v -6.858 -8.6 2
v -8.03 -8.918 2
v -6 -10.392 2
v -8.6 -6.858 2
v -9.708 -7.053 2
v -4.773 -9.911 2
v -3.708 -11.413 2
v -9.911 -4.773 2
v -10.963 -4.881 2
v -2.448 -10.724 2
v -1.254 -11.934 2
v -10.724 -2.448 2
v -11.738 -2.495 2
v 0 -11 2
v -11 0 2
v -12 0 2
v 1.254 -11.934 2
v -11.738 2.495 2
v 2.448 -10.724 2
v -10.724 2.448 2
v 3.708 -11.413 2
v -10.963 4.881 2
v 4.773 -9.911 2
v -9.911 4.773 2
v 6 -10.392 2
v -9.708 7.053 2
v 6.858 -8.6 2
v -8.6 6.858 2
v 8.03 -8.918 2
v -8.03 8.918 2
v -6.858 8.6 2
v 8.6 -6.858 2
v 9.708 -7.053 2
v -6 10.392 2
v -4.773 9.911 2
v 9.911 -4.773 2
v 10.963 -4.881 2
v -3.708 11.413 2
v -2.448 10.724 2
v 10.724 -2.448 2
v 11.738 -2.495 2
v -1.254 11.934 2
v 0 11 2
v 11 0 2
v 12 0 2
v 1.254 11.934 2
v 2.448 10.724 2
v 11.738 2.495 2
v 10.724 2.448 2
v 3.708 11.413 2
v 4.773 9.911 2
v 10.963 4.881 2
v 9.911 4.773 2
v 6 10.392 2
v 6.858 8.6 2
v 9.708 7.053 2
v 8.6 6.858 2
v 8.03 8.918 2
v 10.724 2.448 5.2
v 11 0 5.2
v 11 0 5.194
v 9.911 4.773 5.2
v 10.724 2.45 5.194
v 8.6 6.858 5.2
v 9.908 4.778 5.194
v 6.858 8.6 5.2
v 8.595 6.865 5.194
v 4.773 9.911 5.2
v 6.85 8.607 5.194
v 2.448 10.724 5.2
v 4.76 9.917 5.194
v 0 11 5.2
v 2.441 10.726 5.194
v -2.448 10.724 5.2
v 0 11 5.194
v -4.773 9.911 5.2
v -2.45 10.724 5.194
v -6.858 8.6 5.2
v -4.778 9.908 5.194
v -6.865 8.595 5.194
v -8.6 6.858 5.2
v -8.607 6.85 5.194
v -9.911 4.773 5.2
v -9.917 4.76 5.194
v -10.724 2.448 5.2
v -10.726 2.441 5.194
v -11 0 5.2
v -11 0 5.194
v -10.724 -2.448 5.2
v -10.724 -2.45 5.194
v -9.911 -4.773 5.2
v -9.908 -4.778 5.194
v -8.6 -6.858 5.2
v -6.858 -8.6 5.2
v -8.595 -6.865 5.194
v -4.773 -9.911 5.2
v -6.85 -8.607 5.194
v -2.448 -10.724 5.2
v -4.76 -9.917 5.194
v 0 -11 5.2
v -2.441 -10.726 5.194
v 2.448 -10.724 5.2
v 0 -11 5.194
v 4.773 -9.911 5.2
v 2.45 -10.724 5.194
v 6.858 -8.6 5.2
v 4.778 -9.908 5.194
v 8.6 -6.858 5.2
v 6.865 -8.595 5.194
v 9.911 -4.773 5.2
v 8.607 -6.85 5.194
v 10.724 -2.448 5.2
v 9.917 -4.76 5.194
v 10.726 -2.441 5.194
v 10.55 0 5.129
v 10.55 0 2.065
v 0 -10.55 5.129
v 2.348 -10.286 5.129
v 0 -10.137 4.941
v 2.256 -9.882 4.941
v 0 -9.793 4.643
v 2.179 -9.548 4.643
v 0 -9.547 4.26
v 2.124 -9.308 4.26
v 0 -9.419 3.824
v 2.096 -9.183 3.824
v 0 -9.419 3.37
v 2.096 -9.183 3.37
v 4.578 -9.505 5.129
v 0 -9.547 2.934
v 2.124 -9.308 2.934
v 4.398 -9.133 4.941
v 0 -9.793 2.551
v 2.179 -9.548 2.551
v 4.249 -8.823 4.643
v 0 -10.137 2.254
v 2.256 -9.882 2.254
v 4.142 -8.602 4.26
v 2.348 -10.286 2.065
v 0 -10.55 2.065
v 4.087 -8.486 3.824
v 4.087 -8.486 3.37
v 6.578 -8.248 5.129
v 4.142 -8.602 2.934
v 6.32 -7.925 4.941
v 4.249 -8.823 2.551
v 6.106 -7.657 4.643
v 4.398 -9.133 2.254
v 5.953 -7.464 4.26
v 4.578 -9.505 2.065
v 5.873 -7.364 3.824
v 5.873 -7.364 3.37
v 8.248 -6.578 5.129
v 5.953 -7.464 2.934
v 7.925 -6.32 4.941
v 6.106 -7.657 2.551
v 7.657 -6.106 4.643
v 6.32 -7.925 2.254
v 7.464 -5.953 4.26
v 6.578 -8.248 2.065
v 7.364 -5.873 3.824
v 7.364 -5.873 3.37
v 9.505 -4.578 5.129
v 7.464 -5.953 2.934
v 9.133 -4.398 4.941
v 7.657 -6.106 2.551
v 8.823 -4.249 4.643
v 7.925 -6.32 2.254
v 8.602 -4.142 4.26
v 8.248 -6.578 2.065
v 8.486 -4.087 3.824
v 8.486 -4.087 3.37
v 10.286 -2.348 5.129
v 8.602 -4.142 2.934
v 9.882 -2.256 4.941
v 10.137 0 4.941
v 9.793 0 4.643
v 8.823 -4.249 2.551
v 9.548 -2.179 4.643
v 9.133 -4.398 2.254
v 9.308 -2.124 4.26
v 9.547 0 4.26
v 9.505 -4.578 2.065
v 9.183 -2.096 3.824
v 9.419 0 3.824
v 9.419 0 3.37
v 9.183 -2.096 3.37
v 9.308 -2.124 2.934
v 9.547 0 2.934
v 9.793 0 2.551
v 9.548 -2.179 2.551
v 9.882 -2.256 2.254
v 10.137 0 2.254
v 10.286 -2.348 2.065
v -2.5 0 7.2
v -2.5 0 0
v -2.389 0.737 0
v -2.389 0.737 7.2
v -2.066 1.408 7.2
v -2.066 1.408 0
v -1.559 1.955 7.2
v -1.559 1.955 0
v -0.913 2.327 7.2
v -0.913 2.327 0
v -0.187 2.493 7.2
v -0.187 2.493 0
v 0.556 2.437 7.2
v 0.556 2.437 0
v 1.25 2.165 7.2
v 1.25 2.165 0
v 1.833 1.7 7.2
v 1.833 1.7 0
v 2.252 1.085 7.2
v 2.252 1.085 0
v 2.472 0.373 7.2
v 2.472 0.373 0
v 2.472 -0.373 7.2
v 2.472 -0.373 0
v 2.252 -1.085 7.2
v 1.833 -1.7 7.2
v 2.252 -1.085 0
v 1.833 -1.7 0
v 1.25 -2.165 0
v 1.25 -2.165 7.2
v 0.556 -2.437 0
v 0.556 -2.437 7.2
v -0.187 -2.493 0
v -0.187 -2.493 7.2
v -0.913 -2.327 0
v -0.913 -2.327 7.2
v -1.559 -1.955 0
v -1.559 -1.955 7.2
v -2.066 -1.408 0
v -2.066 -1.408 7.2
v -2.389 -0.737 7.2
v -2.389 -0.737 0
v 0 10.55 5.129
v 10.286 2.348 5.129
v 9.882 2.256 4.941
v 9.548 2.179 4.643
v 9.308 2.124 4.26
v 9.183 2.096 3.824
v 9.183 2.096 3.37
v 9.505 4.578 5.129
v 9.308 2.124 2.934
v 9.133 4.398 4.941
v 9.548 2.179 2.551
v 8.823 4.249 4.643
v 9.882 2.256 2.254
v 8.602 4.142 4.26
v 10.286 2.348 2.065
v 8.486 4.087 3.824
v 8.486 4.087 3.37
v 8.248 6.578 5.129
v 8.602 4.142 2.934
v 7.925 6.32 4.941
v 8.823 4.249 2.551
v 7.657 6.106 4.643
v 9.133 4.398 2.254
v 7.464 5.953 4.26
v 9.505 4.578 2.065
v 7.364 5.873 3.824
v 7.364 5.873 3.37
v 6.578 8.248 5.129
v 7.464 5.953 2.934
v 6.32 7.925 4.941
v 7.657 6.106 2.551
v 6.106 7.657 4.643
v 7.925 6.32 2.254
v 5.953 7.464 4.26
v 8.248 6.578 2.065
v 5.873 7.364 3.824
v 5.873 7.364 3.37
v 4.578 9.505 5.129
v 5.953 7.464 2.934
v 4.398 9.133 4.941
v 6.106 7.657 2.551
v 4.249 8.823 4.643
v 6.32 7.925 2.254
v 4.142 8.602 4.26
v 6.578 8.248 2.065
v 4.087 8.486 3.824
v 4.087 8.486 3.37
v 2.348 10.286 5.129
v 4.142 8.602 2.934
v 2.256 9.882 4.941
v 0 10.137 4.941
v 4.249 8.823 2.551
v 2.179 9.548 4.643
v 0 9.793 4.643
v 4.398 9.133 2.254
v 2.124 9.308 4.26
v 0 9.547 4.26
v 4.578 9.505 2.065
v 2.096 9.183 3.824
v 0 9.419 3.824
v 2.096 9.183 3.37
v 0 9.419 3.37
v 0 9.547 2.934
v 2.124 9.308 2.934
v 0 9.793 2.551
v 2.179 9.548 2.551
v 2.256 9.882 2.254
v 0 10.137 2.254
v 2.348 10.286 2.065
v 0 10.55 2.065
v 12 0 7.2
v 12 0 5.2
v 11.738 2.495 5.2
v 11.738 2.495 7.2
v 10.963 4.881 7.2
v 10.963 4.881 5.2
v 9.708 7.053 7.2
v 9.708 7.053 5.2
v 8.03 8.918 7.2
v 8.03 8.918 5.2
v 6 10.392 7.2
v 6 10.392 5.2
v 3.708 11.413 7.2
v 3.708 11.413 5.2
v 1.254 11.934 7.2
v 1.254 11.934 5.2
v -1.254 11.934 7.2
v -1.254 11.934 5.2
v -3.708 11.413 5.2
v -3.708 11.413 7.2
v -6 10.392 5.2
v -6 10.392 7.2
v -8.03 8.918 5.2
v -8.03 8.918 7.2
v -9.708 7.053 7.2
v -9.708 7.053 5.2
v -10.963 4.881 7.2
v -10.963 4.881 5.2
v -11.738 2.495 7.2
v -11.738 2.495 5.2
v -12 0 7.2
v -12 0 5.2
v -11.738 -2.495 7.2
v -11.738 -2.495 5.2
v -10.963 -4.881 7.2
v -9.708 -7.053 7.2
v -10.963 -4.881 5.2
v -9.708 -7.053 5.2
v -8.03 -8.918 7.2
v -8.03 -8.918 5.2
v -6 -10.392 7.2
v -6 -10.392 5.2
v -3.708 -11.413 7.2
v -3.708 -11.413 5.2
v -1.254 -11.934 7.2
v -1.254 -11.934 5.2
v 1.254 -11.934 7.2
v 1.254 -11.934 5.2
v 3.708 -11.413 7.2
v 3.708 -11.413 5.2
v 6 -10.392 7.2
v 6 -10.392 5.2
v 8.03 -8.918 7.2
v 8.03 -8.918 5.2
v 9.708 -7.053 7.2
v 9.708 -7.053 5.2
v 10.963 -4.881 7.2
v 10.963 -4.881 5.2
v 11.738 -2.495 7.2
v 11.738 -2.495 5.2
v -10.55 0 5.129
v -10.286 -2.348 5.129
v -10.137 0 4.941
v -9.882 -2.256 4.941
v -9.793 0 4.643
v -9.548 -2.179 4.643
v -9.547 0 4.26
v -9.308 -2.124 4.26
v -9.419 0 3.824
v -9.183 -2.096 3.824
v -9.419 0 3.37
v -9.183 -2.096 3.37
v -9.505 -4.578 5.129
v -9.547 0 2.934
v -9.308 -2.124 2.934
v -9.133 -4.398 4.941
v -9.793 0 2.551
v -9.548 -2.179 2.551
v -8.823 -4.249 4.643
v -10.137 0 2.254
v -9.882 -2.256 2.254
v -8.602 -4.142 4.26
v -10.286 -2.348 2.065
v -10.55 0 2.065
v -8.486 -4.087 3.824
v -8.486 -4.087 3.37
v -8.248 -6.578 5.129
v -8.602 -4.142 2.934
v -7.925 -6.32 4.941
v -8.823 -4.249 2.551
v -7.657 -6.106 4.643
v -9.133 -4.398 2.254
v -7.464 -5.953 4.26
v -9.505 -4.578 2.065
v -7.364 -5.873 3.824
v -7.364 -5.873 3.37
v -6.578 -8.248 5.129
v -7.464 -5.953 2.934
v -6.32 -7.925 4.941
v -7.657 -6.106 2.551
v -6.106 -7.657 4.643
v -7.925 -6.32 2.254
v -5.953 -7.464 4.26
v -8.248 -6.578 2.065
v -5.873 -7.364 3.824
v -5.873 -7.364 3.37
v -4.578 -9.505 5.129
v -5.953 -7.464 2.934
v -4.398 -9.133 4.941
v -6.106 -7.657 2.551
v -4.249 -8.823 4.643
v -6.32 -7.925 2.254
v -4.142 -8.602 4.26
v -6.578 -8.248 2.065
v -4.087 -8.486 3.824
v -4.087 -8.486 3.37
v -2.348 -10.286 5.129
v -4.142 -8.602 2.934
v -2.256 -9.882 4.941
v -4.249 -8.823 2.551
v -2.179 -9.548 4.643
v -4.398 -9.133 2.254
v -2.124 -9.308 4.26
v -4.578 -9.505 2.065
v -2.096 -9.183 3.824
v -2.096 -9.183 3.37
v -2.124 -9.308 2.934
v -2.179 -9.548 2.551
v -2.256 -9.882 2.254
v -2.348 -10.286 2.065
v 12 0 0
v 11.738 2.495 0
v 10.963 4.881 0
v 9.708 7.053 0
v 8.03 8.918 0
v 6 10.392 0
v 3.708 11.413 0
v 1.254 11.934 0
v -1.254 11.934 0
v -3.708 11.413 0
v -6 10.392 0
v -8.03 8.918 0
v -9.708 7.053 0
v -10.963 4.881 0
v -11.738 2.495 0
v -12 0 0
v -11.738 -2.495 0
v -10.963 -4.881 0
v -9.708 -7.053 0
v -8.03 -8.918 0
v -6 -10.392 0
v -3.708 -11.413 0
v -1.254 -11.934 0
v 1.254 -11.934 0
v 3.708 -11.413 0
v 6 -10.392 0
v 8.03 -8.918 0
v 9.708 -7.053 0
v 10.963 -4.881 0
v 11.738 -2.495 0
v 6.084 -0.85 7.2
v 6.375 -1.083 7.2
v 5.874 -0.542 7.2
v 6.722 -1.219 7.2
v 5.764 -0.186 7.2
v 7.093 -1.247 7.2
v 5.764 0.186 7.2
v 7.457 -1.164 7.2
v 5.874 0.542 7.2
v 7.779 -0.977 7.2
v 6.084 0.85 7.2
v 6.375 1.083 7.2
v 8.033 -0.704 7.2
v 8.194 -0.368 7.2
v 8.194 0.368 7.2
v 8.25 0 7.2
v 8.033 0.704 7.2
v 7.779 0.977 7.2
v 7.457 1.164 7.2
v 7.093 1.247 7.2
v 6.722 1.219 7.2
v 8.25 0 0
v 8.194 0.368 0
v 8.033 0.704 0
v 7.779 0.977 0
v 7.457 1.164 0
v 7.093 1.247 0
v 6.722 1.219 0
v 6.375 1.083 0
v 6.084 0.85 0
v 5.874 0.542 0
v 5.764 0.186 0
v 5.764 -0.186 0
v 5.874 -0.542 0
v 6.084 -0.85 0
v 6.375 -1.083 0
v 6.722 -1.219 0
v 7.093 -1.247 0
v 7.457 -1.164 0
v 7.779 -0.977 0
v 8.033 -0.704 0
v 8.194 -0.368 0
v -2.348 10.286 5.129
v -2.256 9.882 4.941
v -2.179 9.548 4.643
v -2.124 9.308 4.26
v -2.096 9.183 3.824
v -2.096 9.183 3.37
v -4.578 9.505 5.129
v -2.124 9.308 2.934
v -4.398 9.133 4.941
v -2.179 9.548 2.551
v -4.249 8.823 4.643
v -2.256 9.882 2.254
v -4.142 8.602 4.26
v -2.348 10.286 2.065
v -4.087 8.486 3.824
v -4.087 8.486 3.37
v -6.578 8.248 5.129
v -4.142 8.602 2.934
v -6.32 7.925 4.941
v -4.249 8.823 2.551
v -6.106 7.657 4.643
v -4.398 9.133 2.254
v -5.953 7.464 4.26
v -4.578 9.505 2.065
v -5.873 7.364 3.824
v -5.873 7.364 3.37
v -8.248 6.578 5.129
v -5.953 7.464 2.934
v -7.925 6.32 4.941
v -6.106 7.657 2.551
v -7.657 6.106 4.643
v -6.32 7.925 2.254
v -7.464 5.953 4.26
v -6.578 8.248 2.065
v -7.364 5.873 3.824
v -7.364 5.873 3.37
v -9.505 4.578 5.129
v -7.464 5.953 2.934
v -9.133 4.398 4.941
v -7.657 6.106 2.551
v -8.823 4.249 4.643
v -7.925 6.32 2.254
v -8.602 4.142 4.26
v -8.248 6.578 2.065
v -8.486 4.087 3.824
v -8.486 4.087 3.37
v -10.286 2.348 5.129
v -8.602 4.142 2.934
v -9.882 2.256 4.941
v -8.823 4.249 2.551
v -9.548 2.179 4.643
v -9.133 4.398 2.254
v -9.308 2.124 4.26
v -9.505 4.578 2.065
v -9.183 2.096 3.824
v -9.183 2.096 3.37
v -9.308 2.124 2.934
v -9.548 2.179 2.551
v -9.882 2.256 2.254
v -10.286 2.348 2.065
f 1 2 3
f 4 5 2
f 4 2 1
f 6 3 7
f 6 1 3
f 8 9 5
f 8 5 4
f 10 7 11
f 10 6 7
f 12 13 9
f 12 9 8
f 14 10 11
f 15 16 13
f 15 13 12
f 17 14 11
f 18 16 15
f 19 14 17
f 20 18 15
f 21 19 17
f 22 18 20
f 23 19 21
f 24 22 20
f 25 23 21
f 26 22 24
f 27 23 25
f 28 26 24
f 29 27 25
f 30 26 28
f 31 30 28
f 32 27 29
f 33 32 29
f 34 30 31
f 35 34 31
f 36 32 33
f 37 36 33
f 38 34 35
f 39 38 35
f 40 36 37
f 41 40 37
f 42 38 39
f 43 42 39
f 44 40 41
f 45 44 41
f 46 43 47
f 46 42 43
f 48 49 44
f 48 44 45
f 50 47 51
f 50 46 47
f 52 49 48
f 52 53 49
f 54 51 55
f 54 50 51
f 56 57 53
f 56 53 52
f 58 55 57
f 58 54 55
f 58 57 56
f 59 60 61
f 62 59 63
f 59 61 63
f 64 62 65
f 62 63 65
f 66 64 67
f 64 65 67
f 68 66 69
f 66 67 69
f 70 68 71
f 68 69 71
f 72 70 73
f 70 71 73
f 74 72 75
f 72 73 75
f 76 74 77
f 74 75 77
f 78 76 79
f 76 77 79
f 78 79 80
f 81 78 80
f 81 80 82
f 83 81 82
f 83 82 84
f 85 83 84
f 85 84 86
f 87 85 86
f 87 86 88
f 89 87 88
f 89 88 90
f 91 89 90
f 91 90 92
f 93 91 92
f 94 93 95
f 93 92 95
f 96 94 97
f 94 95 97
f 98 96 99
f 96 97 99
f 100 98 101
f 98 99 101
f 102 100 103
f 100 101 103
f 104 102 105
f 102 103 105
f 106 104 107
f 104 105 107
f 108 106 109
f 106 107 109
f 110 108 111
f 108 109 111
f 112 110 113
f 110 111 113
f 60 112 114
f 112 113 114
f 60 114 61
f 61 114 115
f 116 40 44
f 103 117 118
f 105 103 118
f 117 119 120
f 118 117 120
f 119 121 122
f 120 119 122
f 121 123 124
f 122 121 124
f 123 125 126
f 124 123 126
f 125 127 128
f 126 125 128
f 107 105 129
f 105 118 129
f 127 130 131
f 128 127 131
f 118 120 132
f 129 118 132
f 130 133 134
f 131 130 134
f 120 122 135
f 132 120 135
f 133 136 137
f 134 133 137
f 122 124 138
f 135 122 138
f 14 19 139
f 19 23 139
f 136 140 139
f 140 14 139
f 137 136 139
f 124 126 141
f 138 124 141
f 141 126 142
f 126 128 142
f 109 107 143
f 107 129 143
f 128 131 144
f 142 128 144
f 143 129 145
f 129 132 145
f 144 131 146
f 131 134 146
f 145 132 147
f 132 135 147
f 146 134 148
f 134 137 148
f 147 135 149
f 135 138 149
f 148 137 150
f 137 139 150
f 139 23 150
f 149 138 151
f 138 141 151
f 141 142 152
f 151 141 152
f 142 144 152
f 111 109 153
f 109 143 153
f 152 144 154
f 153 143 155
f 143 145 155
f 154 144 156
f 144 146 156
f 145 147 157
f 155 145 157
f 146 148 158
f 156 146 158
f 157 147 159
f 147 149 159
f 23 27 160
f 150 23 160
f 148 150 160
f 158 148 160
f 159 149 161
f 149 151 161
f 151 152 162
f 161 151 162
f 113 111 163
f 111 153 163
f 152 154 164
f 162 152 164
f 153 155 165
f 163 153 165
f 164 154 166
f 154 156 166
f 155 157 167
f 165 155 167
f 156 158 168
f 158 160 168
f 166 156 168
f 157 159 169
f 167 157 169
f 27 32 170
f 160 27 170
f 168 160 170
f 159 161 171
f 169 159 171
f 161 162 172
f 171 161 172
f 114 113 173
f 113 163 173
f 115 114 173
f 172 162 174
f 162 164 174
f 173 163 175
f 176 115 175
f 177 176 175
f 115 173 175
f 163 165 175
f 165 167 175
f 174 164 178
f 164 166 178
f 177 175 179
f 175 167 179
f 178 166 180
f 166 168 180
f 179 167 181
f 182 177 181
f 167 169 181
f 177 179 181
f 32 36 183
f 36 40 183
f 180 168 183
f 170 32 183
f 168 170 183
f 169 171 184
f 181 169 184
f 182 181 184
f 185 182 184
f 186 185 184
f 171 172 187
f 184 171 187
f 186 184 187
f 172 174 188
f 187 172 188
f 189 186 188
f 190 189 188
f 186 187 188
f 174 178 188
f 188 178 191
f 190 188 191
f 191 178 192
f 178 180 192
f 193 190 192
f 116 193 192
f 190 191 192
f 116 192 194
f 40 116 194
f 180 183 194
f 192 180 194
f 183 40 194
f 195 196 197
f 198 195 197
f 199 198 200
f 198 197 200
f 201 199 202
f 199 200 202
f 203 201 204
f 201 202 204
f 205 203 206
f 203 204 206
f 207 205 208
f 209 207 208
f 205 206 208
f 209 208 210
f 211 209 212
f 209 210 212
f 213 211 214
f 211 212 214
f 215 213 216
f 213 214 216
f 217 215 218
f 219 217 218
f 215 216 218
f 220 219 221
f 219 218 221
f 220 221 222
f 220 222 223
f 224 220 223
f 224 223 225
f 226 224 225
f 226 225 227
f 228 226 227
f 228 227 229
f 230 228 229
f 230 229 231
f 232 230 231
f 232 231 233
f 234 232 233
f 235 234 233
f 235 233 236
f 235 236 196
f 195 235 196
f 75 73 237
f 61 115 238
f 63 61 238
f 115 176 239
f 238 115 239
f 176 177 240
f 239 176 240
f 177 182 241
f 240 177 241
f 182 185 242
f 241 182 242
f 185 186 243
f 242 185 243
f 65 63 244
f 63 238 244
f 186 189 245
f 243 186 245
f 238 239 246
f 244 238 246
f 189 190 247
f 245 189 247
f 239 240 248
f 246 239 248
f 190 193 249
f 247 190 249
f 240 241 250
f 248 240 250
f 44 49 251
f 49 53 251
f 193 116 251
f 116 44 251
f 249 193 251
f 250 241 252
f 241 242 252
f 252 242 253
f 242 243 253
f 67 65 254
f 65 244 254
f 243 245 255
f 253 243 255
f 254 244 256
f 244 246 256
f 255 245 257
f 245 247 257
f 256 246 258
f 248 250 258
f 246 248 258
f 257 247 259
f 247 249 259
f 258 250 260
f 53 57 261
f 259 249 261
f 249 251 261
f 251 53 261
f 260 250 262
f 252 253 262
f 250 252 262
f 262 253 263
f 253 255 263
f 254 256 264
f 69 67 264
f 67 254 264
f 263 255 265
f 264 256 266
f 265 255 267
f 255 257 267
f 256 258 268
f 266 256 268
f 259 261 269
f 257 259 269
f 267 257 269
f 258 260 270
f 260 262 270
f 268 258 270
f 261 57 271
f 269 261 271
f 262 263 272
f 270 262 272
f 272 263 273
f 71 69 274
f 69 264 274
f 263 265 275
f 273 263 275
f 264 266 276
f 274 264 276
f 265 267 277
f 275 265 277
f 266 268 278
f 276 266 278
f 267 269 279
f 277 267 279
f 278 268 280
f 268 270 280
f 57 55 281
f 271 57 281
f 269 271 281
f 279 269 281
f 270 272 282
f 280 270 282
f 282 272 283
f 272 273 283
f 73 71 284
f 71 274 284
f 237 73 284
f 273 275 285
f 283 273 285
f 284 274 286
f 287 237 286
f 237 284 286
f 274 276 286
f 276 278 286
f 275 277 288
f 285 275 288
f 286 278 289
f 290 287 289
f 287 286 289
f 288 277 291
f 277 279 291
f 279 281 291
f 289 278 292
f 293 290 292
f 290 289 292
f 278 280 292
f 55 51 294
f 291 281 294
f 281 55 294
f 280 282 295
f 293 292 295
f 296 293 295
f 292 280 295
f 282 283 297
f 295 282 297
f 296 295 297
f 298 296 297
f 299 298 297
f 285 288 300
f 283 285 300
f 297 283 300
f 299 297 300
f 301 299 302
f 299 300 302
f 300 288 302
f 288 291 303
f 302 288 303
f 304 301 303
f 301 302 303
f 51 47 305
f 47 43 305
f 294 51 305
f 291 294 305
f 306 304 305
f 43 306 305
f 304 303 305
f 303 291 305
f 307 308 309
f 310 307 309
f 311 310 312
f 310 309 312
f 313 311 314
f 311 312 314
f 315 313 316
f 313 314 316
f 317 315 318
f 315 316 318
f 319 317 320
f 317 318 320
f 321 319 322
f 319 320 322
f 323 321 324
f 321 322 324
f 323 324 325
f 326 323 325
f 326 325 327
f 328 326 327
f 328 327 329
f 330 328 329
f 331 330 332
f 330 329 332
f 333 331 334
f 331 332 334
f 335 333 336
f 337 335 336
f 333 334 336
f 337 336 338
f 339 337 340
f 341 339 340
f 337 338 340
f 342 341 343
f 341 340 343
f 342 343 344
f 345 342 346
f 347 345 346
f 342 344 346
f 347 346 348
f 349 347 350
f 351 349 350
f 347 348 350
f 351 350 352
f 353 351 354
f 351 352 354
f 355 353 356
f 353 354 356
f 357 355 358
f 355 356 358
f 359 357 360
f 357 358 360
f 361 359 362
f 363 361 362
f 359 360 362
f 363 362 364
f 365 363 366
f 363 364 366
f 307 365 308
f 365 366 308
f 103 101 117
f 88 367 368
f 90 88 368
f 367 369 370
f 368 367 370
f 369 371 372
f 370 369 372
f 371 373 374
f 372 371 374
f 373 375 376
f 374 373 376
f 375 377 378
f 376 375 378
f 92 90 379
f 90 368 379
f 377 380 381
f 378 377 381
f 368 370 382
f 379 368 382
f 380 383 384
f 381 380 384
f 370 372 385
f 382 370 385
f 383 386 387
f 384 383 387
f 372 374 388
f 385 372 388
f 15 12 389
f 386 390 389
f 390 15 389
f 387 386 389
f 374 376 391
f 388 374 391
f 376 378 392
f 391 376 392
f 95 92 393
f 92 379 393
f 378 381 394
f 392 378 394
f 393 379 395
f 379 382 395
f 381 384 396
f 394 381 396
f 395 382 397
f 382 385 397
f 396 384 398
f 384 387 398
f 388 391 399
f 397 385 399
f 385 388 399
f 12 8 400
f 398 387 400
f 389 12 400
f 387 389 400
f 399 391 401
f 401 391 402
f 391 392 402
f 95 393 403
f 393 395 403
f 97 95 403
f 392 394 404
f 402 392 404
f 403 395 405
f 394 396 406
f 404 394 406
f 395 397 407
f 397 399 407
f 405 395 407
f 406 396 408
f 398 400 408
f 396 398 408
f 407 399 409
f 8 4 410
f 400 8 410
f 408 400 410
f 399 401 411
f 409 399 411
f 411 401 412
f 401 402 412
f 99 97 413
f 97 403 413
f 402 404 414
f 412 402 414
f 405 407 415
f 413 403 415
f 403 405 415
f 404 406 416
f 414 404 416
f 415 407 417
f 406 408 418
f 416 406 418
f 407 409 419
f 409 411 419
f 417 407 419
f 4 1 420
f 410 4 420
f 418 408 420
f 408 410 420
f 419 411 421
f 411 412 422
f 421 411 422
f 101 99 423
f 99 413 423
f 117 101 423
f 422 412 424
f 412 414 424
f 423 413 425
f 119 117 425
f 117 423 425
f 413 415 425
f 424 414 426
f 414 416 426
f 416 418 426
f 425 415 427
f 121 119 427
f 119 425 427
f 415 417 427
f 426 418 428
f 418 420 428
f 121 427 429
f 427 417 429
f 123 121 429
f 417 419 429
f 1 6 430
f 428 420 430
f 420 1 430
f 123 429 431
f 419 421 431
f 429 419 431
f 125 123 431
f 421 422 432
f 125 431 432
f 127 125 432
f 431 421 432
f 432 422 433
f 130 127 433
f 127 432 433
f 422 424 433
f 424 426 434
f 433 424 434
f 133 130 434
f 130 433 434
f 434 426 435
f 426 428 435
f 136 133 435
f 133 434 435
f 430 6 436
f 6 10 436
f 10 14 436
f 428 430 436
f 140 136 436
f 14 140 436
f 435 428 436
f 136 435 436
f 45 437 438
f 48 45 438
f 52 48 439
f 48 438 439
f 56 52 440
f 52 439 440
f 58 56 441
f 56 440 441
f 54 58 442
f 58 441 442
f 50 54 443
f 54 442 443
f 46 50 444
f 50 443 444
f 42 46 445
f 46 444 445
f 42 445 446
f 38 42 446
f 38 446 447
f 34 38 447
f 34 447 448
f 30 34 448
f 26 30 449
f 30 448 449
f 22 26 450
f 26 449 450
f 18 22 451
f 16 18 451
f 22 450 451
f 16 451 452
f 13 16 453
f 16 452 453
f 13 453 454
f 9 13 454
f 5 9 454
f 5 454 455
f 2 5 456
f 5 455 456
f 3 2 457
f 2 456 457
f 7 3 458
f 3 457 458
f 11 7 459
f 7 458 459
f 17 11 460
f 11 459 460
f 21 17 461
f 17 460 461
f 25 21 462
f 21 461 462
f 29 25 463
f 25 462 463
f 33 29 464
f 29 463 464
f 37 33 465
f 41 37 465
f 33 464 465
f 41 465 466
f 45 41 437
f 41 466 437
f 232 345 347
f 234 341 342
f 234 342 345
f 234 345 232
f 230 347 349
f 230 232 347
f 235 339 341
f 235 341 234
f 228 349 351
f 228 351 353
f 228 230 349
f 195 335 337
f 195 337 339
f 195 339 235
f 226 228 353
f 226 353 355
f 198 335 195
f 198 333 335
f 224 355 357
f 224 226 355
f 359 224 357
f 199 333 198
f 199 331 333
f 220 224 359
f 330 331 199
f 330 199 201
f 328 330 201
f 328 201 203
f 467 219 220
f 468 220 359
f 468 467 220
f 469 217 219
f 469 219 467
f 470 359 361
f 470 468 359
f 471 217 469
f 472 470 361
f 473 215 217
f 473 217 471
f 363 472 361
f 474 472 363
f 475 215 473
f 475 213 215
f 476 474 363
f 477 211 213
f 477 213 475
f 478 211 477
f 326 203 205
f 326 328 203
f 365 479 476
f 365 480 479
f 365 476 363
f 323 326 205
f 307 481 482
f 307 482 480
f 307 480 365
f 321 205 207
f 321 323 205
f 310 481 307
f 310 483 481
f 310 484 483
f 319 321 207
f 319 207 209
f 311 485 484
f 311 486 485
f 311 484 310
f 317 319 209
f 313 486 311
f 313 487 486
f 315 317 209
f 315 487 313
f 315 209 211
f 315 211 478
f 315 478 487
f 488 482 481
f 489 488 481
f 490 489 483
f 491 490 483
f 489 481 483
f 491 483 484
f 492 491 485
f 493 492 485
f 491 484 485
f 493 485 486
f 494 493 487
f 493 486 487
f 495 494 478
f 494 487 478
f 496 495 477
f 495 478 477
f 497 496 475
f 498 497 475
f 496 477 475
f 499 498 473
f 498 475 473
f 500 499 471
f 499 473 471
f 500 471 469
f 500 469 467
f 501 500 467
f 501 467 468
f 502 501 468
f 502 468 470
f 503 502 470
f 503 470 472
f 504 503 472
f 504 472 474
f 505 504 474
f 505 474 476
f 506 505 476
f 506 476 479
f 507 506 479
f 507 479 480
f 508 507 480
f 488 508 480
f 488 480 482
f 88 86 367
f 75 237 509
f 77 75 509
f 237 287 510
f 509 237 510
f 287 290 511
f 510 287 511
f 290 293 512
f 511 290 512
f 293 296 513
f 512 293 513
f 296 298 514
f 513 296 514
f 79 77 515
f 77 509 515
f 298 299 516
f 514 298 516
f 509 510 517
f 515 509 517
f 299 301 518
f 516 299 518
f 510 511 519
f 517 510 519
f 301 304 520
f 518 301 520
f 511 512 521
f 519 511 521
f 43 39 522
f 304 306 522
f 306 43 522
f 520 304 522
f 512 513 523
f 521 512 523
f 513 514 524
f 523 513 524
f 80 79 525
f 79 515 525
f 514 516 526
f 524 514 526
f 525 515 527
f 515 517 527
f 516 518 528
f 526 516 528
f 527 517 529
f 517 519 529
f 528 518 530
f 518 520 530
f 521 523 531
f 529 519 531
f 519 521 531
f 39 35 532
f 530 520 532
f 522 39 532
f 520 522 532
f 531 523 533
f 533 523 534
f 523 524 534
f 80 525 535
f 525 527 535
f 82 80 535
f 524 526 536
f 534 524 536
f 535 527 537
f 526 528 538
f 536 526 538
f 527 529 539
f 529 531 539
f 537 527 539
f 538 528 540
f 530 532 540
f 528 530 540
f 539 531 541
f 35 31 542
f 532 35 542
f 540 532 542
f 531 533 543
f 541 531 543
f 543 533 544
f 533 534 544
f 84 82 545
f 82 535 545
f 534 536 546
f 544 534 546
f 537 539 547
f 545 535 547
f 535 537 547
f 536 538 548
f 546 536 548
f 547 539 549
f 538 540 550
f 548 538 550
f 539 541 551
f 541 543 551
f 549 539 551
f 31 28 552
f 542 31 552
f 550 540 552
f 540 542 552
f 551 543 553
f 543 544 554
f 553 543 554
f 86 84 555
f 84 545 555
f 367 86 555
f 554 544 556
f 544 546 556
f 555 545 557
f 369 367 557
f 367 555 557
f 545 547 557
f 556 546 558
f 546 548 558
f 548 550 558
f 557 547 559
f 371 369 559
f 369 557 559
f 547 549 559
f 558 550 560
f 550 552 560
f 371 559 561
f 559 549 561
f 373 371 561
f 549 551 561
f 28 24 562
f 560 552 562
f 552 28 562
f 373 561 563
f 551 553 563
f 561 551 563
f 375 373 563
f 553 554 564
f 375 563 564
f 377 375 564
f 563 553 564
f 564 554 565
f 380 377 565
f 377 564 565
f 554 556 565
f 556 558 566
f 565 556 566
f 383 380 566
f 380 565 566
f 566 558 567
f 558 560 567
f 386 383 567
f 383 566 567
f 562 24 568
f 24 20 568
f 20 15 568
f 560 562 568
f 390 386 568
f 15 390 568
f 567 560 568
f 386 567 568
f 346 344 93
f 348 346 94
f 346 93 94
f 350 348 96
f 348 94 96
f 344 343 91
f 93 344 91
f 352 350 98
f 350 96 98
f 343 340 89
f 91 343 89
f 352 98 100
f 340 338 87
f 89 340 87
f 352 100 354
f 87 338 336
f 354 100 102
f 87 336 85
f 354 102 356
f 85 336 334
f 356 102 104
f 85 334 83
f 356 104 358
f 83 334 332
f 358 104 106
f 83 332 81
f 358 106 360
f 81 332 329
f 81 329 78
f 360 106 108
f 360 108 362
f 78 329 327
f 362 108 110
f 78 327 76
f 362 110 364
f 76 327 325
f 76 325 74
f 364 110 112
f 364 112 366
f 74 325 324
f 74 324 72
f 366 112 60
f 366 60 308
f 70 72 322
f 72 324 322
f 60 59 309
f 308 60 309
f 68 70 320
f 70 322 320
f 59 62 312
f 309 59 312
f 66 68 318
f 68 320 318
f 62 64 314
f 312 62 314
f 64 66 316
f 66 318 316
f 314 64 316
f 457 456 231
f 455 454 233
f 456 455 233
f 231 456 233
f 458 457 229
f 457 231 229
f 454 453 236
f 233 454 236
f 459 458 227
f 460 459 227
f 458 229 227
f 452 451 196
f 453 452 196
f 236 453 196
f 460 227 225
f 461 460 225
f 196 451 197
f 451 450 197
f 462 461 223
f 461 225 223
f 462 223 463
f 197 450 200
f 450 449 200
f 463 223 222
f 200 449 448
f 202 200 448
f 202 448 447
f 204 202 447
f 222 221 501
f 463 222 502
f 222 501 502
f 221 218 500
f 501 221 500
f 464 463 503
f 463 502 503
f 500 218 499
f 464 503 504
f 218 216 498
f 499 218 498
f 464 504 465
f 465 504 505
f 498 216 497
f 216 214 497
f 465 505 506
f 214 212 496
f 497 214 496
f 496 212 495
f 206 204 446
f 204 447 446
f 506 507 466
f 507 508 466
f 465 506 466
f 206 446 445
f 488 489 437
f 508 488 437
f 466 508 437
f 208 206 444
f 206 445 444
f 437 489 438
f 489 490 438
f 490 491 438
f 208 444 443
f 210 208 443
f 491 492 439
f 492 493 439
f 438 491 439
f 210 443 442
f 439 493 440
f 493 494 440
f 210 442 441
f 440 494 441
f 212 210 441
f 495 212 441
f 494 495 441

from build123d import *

# Parameters (mm, degrees)
SKETCH_1_R          = 12
EXTRUDE_1_DEPTH     = 2
SKETCH_2_R          = 11
EXTRUDE_2_DEPTH     = 3.2
SKETCH_3_R          = 12
EXTRUDE_3_DEPTH     = 2
SKETCH_4_R          = 2.5
CUT_EXTRUDE_1_DEPTH = 30
SKETCH_3D_1_R       = 1.597010155
M3X0_5_1_D          = 2.5
M3X0_5_1_DEPTH      = 8.5
M3X0_5_1_TIP        = 0.751075774


with BuildPart() as part:
    # ｽｹｯﾁ1 → ﾎﾞｽ - 押し出し1 (new body)
    with BuildSketch(Plane.XY):
        Circle(SKETCH_1_R)
    extrude(amount=EXTRUDE_1_DEPTH)

    # ｽｹｯﾁ2 → ﾎﾞｽ - 押し出し2 (add)
    with BuildSketch(Plane.XY.offset(2)):
        Circle(SKETCH_2_R)
    extrude(amount=EXTRUDE_2_DEPTH)

    # ｽｹｯﾁ3 → ﾎﾞｽ - 押し出し3 (add)
    with BuildSketch(Plane.XY.offset(5.2)):
        Circle(SKETCH_3_R)
    extrude(amount=EXTRUDE_3_DEPTH)

    # ｽｹｯﾁ4 → ｶｯﾄ - 押し出し1 (cut)
    with BuildSketch(Plane(origin=(0, 0, 0), x_dir=(-1, 0, 0), z_dir=(0, 0, -1))):
        Circle(SKETCH_4_R)
    extrude(amount=-CUT_EXTRUDE_1_DEPTH, mode=Mode.SUBTRACT)

    # ｶｯﾄ - ｽｲｰﾌﾟ1: sweep along a curve in space
    with BuildLine() as sweep_1_path:
        ThreePointArc((11, 0, 5.2), (7.778174593, 7.778174593, 5.2), (0, 11, 5.2))
        ThreePointArc((0, 11, 5.2), (-7.778174593, 7.778174593, 5.2), (-11, 0, 5.2))
        ThreePointArc((-11, 0, 5.2), (-7.778174593, -7.778174593, 5.2), (0, -11, 5.2))
        ThreePointArc((0, -11, 5.2), (7.778174593, -7.778174593, 5.2), (11, 0, 5.2))
    # Sketch 3D_1 → ｶｯﾄ - ｽｲｰﾌﾟ1 (sweep, cut)
    with BuildSketch(Plane(origin=(11, 0, 5.2), x_dir=(0, 0, -1), z_dir=(0, -1, 0))):
        with Locations((1.602989845, 0)):
            Circle(SKETCH_3D_1_R)
    sweep(path=sweep_1_path.line, mode=Mode.SUBTRACT)

    # M3x0.5 ねじ穴1
    with Locations(Plane(origin=(7, 0, 0), x_dir=(-1, 0, 0), z_dir=(0, 0, -1))):
        with Locations((0, 0)):
            Hole(M3X0_5_1_D / 2, depth=M3X0_5_1_DEPTH)
            with Locations((0, 0, -(M3X0_5_1_DEPTH + M3X0_5_1_TIP / 2))):  # 118° drill point
                Cone(0, M3X0_5_1_D / 2, M3X0_5_1_TIP, mode=Mode.SUBTRACT)


solid = part.part
